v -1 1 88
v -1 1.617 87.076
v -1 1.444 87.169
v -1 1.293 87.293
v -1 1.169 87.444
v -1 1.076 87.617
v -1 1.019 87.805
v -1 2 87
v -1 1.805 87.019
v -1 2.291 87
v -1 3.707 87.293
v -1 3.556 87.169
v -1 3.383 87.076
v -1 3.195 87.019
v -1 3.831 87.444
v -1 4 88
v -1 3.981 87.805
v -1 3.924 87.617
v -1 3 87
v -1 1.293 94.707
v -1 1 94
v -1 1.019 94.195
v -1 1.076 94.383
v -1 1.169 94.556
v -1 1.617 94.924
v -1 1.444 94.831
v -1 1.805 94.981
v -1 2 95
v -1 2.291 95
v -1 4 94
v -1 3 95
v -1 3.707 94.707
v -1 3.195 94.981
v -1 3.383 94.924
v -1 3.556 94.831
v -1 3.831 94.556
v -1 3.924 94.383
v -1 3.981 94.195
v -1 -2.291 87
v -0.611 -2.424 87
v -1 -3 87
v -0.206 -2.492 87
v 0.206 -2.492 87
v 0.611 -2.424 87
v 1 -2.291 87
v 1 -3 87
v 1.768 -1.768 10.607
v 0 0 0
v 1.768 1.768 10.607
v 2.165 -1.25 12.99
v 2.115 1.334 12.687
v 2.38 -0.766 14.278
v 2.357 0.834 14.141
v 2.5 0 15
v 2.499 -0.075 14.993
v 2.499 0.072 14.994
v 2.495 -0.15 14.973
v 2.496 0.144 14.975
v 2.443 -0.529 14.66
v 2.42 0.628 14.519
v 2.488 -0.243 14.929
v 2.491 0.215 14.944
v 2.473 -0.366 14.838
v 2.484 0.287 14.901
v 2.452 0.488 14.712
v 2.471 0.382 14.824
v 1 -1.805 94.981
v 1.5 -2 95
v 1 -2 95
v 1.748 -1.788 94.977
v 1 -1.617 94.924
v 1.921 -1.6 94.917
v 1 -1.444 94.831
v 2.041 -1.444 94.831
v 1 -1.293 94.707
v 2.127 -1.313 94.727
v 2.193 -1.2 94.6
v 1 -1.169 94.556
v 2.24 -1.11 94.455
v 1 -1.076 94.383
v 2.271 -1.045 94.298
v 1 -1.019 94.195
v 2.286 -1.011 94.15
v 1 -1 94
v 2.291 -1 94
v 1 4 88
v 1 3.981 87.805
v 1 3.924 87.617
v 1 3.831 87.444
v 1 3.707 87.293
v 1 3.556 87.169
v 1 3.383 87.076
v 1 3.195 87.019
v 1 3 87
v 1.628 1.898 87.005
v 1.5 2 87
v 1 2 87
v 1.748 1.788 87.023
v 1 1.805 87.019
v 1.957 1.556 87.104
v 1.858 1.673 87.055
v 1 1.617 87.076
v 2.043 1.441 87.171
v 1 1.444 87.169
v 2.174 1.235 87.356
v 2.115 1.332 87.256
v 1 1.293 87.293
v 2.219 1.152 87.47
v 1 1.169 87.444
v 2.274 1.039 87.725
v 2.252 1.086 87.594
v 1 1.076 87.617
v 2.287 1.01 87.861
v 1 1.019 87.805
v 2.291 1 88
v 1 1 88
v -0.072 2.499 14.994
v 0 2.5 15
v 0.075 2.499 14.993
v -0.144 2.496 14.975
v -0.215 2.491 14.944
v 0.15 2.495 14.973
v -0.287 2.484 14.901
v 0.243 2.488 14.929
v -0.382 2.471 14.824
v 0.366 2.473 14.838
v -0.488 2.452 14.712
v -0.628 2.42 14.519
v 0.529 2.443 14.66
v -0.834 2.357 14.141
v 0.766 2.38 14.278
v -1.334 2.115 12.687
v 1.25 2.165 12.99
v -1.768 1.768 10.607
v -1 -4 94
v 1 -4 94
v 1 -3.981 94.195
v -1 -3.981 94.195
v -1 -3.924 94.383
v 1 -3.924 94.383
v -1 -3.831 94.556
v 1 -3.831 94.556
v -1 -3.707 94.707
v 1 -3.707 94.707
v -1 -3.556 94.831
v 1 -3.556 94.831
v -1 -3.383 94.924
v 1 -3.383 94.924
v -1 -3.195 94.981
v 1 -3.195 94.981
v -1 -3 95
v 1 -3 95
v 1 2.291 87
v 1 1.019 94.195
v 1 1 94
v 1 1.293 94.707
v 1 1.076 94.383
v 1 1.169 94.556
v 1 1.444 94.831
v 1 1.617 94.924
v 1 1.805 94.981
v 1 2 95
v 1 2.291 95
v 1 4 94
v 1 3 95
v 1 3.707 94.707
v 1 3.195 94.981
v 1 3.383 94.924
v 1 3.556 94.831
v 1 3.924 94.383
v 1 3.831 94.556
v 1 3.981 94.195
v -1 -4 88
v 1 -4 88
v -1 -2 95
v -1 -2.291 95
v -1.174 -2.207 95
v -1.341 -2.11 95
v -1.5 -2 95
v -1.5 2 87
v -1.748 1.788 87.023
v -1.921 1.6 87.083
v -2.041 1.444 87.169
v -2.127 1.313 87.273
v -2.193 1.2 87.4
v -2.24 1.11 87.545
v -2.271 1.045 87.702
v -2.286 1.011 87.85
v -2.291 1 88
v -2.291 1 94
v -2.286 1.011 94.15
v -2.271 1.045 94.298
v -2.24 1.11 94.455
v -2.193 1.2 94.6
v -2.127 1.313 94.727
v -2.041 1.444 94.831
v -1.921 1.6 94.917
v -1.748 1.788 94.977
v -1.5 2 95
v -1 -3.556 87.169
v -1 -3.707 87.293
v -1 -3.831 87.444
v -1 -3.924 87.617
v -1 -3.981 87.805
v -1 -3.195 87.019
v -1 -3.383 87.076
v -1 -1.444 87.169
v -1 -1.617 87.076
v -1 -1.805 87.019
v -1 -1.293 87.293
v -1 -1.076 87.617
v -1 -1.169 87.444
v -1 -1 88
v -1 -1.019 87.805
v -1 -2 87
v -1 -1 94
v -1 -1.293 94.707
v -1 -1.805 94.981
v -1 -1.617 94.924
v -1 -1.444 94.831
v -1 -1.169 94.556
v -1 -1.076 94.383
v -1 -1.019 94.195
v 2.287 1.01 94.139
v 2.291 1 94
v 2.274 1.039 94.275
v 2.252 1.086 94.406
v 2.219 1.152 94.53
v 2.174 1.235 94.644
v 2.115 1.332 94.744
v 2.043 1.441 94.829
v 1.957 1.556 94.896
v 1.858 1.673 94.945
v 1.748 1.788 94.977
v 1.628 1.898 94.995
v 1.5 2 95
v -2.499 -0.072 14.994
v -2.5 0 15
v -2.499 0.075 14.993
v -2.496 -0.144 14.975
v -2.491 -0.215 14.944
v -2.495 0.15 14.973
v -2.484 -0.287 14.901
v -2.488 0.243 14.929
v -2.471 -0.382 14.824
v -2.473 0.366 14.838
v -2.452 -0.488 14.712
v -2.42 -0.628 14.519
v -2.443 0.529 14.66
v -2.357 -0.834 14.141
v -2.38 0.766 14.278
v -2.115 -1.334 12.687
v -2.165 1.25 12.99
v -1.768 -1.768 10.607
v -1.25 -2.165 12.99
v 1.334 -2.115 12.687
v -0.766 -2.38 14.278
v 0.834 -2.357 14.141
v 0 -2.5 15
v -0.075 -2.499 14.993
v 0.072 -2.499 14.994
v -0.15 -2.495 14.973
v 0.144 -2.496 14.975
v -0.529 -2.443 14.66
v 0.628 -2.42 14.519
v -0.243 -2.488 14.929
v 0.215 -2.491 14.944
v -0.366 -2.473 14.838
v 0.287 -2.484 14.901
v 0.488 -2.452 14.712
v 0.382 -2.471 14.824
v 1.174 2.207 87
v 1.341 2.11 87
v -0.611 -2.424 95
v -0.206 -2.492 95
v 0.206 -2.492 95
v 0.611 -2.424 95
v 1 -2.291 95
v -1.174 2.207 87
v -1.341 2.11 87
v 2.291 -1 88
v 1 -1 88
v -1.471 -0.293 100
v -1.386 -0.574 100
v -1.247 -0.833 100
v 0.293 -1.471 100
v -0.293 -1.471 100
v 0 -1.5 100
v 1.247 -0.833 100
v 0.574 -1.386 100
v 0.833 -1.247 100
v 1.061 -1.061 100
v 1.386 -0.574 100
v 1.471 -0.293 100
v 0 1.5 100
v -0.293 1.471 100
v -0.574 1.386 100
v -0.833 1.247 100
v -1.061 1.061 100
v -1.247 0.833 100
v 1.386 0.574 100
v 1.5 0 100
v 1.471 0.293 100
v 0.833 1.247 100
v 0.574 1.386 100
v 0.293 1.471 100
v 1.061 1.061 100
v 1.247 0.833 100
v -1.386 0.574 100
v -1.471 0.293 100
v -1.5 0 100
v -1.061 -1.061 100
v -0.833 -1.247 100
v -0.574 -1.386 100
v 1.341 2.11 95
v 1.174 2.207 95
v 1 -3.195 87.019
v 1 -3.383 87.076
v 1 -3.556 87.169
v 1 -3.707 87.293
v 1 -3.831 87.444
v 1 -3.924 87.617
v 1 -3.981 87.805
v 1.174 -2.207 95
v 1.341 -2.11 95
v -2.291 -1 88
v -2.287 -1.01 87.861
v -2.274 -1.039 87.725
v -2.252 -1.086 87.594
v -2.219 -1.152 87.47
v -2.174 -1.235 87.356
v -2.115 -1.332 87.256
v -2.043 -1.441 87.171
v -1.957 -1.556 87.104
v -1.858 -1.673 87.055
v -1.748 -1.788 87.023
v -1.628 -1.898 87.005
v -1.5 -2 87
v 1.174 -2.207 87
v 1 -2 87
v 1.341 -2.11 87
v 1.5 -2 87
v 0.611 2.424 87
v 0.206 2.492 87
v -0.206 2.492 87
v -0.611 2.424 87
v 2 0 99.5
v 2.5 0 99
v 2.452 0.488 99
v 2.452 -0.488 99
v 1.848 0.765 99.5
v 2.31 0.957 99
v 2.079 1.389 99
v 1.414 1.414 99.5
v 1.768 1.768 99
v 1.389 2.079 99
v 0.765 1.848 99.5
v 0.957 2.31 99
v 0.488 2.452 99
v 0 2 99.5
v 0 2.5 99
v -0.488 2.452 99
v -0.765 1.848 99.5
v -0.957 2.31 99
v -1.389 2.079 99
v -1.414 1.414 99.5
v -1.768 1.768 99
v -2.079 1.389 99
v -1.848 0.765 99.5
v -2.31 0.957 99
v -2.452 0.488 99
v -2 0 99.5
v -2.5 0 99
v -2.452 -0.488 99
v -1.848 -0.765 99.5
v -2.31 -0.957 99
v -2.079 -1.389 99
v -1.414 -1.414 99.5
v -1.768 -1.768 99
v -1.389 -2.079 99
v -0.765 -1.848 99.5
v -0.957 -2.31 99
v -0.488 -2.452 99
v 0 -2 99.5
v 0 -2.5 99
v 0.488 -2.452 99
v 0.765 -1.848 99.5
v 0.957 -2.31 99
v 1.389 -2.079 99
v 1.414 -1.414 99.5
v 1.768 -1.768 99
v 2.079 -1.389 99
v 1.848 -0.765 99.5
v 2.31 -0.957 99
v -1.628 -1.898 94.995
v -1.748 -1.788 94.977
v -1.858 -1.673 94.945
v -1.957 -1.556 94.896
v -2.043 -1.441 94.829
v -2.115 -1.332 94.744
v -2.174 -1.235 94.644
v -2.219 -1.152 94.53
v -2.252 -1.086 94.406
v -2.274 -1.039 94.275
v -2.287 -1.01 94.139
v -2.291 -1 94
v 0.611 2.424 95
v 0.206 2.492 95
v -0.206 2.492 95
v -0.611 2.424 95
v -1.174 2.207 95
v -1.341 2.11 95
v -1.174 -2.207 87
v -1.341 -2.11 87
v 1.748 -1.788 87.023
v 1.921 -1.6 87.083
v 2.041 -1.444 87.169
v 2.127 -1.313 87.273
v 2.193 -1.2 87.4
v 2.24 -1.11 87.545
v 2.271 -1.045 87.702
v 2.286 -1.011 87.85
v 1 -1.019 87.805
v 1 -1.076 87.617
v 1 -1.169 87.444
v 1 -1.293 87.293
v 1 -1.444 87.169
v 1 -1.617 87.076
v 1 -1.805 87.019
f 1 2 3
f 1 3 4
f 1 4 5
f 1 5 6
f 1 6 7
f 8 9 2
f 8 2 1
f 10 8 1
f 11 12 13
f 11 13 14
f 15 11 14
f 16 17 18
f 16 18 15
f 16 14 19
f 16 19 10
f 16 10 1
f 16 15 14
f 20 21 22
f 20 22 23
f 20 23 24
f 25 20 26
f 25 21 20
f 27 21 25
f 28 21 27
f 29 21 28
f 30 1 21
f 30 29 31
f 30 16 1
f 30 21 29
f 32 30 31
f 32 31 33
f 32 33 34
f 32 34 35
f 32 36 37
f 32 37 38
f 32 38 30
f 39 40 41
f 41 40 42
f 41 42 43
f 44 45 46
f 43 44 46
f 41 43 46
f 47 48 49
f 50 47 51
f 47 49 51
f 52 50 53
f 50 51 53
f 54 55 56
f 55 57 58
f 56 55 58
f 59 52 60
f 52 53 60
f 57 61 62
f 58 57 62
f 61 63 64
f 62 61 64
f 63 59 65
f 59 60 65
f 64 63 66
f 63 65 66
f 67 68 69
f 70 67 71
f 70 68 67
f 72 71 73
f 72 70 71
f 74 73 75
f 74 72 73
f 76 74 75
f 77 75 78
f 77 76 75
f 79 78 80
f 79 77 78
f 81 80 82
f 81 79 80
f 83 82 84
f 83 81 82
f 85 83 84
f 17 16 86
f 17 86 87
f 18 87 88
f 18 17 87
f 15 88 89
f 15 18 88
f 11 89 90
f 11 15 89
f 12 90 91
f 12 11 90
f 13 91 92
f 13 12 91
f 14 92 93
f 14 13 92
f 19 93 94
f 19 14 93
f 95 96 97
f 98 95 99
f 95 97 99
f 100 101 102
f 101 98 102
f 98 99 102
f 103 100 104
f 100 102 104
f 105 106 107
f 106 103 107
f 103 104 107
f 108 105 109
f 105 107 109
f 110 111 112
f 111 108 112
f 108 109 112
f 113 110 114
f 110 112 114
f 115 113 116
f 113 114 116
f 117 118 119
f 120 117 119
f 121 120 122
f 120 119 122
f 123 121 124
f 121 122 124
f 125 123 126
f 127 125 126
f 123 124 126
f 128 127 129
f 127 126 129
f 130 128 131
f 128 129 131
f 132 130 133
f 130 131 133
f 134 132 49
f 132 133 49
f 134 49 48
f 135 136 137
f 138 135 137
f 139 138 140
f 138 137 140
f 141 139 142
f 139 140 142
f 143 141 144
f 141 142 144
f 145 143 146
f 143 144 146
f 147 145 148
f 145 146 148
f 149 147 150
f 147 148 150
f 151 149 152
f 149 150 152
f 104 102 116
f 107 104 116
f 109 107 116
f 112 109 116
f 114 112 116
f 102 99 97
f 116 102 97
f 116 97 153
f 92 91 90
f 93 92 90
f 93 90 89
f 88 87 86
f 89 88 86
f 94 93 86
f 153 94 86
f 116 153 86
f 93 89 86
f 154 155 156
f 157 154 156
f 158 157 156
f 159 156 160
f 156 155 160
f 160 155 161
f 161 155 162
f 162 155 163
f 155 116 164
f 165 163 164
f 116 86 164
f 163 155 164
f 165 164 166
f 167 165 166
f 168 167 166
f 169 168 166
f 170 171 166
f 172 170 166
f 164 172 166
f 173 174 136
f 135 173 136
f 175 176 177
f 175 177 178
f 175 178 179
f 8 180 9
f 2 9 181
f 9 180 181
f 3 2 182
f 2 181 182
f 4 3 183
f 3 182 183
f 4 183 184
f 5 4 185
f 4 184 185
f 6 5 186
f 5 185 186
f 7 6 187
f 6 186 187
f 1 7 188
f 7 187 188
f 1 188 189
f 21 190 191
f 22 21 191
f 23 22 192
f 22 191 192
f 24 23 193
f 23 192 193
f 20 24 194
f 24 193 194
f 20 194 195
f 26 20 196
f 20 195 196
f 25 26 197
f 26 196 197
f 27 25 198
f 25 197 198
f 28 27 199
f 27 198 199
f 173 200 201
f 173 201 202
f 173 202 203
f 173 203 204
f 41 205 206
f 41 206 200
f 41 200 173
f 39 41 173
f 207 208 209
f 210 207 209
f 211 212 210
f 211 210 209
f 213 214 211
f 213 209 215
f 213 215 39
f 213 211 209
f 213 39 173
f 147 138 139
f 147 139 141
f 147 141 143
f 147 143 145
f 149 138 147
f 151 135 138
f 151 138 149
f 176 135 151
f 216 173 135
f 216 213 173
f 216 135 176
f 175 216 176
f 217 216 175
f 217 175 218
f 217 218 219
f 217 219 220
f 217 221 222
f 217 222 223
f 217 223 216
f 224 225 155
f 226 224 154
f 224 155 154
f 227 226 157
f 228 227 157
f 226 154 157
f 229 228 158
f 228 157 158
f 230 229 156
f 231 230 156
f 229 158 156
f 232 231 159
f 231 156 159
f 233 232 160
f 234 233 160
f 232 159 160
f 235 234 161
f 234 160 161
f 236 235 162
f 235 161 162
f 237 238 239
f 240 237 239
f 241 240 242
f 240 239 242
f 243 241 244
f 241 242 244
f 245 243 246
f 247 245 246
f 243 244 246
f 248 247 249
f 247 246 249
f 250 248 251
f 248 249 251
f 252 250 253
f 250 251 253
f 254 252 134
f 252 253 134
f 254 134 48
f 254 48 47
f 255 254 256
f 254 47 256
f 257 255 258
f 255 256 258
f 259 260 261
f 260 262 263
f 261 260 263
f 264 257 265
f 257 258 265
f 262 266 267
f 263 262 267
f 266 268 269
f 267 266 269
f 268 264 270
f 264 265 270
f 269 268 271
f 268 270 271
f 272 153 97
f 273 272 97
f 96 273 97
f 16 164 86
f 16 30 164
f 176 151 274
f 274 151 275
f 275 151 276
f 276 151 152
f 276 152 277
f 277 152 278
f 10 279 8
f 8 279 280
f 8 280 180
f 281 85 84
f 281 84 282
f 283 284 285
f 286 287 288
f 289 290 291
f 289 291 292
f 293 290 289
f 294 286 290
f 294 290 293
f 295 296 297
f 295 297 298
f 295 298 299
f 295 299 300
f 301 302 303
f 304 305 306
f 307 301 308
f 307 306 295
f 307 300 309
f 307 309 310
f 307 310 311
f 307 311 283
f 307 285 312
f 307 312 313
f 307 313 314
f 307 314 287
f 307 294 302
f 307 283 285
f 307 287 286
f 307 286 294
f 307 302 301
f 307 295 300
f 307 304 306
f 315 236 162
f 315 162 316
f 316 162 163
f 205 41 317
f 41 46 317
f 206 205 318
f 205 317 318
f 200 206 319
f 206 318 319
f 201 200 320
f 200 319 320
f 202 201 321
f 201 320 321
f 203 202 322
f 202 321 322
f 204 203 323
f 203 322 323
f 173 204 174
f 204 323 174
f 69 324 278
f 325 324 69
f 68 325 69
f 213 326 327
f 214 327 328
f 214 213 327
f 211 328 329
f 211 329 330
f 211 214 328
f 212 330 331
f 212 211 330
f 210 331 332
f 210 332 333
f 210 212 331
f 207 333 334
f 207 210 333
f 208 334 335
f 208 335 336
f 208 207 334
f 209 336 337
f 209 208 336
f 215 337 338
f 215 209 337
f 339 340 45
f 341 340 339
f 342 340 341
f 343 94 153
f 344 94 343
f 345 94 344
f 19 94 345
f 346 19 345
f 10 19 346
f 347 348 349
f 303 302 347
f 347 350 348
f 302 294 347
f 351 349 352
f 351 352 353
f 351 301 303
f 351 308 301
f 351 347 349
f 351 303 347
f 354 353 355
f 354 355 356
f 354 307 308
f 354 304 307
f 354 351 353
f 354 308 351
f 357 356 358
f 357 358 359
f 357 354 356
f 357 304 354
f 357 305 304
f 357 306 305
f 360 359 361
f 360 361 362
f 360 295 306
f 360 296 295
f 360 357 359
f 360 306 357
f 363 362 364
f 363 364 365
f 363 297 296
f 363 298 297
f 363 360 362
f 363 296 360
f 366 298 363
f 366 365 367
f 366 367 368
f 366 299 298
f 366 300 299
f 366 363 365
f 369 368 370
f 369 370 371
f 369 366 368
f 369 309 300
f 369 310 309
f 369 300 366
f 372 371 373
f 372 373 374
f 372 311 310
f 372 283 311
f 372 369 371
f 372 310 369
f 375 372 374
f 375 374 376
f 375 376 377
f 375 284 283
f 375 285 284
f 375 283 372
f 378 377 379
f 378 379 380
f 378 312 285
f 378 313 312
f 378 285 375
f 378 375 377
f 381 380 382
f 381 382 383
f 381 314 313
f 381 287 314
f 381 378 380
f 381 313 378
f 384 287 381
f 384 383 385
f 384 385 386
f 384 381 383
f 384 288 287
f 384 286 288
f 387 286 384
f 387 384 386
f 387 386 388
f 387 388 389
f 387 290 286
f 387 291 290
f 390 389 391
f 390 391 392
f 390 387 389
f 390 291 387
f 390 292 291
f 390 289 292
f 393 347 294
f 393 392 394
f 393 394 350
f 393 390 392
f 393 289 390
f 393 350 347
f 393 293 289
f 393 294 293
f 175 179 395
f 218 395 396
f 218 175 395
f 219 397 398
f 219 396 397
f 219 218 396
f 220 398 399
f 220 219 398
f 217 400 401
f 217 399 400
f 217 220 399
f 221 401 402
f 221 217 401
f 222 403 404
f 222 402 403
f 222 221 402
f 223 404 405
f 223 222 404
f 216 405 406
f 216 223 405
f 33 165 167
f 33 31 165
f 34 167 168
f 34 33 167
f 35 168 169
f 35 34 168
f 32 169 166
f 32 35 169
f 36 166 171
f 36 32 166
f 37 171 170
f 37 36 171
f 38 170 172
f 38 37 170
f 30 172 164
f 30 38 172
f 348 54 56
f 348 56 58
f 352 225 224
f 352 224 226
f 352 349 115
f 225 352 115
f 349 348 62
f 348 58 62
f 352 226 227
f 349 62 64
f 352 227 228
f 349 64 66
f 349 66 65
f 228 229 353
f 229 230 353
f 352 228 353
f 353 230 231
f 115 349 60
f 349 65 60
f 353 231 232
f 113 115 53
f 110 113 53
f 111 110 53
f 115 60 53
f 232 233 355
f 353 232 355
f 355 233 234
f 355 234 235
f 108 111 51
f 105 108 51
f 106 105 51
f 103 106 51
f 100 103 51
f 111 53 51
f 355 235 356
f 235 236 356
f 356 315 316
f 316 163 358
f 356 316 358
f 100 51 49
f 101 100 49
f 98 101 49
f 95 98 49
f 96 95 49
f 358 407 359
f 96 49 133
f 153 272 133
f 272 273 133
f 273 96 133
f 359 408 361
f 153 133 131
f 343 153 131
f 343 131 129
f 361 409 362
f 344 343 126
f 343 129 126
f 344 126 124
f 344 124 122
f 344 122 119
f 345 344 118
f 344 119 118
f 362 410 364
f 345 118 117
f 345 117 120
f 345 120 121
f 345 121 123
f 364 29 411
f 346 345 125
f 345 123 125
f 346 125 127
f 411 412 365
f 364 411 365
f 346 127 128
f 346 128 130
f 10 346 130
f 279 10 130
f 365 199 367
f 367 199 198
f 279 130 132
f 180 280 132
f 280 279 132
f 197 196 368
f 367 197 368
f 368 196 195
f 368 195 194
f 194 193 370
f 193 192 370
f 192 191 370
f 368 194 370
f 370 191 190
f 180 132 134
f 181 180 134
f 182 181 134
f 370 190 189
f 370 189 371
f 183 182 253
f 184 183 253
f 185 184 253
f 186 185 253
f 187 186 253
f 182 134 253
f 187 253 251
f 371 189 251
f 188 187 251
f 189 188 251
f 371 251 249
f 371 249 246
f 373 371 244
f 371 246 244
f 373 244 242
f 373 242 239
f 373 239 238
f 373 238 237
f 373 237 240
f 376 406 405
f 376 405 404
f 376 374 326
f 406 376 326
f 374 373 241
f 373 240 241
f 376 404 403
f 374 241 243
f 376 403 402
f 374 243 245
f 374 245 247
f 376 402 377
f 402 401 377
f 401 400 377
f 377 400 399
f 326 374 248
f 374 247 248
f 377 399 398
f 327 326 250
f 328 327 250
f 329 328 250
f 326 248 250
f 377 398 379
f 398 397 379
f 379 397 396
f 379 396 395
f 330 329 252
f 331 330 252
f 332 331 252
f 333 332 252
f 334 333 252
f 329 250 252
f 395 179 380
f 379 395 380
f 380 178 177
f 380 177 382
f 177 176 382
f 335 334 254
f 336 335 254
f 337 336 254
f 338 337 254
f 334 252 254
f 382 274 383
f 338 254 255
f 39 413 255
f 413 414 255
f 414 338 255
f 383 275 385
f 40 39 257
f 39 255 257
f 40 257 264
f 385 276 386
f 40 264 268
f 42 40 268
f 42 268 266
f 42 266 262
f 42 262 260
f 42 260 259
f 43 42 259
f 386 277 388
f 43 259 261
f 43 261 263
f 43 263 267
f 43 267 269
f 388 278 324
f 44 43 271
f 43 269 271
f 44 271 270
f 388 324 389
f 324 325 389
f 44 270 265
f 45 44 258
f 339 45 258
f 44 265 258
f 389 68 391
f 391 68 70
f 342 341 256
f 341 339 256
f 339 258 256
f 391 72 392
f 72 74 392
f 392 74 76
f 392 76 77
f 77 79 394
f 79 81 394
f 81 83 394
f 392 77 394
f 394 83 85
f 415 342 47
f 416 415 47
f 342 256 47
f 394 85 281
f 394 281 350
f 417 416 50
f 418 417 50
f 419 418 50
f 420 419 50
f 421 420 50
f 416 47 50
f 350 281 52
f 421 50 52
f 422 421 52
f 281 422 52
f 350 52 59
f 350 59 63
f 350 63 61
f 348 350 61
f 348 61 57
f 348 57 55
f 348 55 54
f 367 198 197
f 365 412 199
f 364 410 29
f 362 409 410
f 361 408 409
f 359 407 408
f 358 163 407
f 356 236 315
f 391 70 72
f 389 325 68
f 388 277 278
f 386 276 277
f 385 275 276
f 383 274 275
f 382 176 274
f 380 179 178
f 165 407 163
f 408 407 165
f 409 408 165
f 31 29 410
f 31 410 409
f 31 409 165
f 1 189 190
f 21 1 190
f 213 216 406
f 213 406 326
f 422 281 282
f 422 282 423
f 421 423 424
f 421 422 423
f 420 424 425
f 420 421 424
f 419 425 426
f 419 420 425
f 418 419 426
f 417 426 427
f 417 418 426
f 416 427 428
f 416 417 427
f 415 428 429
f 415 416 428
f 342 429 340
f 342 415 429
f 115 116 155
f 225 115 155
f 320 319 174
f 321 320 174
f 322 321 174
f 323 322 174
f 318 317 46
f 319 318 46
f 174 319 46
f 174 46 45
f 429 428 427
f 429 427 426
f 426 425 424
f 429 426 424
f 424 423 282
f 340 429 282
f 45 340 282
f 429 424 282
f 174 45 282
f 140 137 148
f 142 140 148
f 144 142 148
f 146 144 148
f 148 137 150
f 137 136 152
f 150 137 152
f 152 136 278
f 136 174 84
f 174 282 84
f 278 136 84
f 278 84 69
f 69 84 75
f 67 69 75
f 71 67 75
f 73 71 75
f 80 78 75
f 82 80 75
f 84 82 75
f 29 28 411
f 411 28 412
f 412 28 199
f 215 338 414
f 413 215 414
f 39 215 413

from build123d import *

# Parameters (mm, degrees)
SKETCH1_R           = 2.5
BOSS_EXTRUDE1_DEPTH = 100
CUT_EXTRUDE1_DEPTH  = 2.5
BOSS_EXTRUDE2_DEPTH = 1
CHAMFER1_SIZE       = 1
CUT_EXTRUDE2_DEPTH  = 2.5
CUT_EXTRUDE3_DEPTH  = 2.5


with BuildPart() as part:
    # Sketch1 → Boss-Extrude1 (new body)
    with BuildSketch(Plane.XY):
        Circle(SKETCH1_R)
    extrude(amount=BOSS_EXTRUDE1_DEPTH)

    # Sketch2 → Cut-Extrude1 (cut, symmetric)
    with BuildSketch(Plane(origin=(0, 0, 0), x_dir=(0, 0, -1), z_dir=(1, 0, 0))):
        with BuildLine():
            Line((-94, 4), (-88, 4))
            ThreePointArc((-88, 4), (-87.292893219, 3.707106781), (-87, 3))
            Line((-87, 3), (-87, 2))
            ThreePointArc((-87, 2), (-87.292893219, 1.292893219), (-88, 1))
            Line((-88, 1), (-94, 1))
            ThreePointArc((-94, 1), (-94.707106781, 1.292893219), (-95, 2))
            Line((-95, 2), (-95, 3))
            ThreePointArc((-95, 3), (-94.707106781, 3.707106781), (-94, 4))
        make_face()
        with BuildLine():
            Line((-95, -3), (-95, -2))
            ThreePointArc((-95, -2), (-94.707106781, -1.292893219), (-94, -1))
            Line((-94, -1), (-88, -1))
            ThreePointArc((-88, -1), (-87.292893219, -1.292893219), (-87, -2))
            Line((-87, -2), (-87, -3))
            ThreePointArc((-87, -3), (-87.292893219, -3.707106781), (-88, -4))
            Line((-88, -4), (-94, -4))
            ThreePointArc((-94, -4), (-94.707106781, -3.707106781), (-95, -3))
        make_face()
    extrude(amount=CUT_EXTRUDE1_DEPTH, both=True, mode=Mode.SUBTRACT)

    # Sketch2<2> → Boss-Extrude2 (add, symmetric)
    with BuildSketch(Plane(origin=(0, 0, 0), x_dir=(0, 0, -1), z_dir=(1, 0, 0))):
        with BuildLine():
            Line((-94, 4), (-88, 4))
            ThreePointArc((-88, 4), (-87.292893219, 3.707106781), (-87, 3))
            Line((-87, 3), (-87, 2))
            ThreePointArc((-87, 2), (-87.292893219, 1.292893219), (-88, 1))
            Line((-88, 1), (-94, 1))
            ThreePointArc((-94, 1), (-94.707106781, 1.292893219), (-95, 2))
            Line((-95, 2), (-95, 3))
            ThreePointArc((-95, 3), (-94.707106781, 3.707106781), (-94, 4))
        make_face()
        with BuildLine():
            Line((-95, -3), (-95, -2))
            ThreePointArc((-95, -2), (-94.707106781, -1.292893219), (-94, -1))
            Line((-94, -1), (-88, -1))
            ThreePointArc((-88, -1), (-87.292893219, -1.292893219), (-87, -2))
            Line((-87, -2), (-87, -3))
            ThreePointArc((-87, -3), (-87.292893219, -3.707106781), (-88, -4))
            Line((-88, -4), (-94, -4))
            ThreePointArc((-94, -4), (-94.707106781, -3.707106781), (-95, -3))
        make_face()
    extrude(amount=BOSS_EXTRUDE2_DEPTH, both=True)

    # Chamfer1
    chamfer1_edges = [part.edges().sort_by_distance(p)[0] for p in [
        (-2.5, 0, 100),
    ]]
    chamfer(chamfer1_edges, length=CHAMFER1_SIZE)

    # Sketch3 → Cut-Extrude2 (cut, symmetric)
    with BuildSketch(Plane(origin=(0, 0, 0), x_dir=(0, 0, -1), z_dir=(1, 0, 0))):
        Polygon((0, -2.5), (0, 0), (-15, -2.5), align=None)
        Polygon((-15, 2.5), (0, 0), (0, 2.5), align=None)
    extrude(amount=CUT_EXTRUDE2_DEPTH, both=True, mode=Mode.SUBTRACT)

    # Sketch4 → Cut-Extrude3 (cut, symmetric)
    with BuildSketch(Plane(origin=(0, 0, 0), x_dir=(1, 0, 0), z_dir=(0, 1, 0))):
        Polygon((-2.5, -15), (0, 0), (-2.5, 0), align=None)
        Polygon((2.5, 0), (0, 0), (2.5, -15), align=None)
    extrude(amount=CUT_EXTRUDE3_DEPTH, both=True, mode=Mode.SUBTRACT)


solid = part.part
